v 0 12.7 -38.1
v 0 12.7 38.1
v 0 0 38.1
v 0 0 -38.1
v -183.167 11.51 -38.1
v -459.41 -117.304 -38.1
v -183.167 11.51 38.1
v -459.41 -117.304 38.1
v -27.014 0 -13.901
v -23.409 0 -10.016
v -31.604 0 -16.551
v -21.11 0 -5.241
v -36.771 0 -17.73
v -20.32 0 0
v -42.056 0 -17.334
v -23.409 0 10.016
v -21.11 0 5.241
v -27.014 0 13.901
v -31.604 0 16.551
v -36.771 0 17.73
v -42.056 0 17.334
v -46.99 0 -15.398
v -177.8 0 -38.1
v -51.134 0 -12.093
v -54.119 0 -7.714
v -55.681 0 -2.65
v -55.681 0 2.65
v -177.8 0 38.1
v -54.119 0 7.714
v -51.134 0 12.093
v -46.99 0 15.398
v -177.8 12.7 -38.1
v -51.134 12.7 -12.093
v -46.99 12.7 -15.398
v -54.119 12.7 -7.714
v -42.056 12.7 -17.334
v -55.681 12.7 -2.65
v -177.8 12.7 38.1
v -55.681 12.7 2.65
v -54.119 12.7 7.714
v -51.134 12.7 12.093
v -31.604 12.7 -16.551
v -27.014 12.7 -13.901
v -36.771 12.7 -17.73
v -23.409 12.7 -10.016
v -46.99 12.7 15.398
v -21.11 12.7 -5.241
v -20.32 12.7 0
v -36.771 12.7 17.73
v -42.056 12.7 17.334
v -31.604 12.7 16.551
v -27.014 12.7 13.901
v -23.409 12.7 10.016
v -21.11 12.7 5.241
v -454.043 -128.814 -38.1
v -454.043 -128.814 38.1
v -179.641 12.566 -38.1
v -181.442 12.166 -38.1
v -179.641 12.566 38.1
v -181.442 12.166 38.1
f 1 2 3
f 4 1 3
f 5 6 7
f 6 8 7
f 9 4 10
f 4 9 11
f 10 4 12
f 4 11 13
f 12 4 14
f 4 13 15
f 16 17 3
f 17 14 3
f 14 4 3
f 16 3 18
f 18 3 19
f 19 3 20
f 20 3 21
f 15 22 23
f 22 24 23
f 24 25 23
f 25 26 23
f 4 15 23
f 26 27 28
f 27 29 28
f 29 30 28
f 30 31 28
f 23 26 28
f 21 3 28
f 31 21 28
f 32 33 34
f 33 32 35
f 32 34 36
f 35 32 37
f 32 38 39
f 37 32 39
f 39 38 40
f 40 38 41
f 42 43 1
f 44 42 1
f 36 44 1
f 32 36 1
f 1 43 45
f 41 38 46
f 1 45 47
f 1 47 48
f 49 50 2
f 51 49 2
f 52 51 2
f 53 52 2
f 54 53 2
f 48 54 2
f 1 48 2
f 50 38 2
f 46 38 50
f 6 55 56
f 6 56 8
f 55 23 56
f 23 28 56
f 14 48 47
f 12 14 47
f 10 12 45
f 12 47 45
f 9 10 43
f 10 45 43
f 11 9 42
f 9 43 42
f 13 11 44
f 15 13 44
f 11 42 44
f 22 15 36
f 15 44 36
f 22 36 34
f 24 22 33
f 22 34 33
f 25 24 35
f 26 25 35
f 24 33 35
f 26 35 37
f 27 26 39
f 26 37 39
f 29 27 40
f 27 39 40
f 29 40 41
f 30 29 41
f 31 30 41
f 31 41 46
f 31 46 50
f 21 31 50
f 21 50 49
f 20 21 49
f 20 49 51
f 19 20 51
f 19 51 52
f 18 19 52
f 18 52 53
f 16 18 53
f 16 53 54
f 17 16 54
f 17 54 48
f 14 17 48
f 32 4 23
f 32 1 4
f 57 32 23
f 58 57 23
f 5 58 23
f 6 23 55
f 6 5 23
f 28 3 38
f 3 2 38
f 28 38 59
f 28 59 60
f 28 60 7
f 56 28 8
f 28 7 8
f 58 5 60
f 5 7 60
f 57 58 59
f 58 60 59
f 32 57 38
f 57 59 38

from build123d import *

# Parameters (mm, degrees)
BOSS_EXTRUDE1_DEPTH = 38.1
SKETCH2_R           = 17.78
CUT_EXTRUDE1_DEPTH  = 142.514046179


with BuildPart() as part:
    # Sketch1 → Boss-Extrude1 (new body, symmetric)
    with BuildSketch(Plane.XY):
        with BuildLine():
            Line((0, 0), (-177.8, 0))
            Line((-177.8, 0), (-454.042613489, -128.814046179))
            Line((-454.042613489, -128.814046179), (-459.409865413, -117.303937283))
            Line((-459.409865413, -117.303937283), (-183.167251924, 11.510108895))
            ThreePointArc((-183.167251924, 11.510108895), (-180.548783097, 12.39895929), (-177.8, 12.7))
            Line((-177.8, 12.7), (0, 12.7))
            Line((0, 12.7), (0, 0))
        make_face()
    extrude(amount=BOSS_EXTRUDE1_DEPTH, both=True)

    # Sketch2 → Cut-Extrude1 (cut, through all)
    with BuildSketch(Plane(origin=(0, 12.7, 0), x_dir=(1, 0, 0), z_dir=(0, 1, 0))):
        with Locations((-38.1, 0)):
            Circle(SKETCH2_R)
    extrude(amount=-CUT_EXTRUDE1_DEPTH, mode=Mode.SUBTRACT)


solid = part.part
